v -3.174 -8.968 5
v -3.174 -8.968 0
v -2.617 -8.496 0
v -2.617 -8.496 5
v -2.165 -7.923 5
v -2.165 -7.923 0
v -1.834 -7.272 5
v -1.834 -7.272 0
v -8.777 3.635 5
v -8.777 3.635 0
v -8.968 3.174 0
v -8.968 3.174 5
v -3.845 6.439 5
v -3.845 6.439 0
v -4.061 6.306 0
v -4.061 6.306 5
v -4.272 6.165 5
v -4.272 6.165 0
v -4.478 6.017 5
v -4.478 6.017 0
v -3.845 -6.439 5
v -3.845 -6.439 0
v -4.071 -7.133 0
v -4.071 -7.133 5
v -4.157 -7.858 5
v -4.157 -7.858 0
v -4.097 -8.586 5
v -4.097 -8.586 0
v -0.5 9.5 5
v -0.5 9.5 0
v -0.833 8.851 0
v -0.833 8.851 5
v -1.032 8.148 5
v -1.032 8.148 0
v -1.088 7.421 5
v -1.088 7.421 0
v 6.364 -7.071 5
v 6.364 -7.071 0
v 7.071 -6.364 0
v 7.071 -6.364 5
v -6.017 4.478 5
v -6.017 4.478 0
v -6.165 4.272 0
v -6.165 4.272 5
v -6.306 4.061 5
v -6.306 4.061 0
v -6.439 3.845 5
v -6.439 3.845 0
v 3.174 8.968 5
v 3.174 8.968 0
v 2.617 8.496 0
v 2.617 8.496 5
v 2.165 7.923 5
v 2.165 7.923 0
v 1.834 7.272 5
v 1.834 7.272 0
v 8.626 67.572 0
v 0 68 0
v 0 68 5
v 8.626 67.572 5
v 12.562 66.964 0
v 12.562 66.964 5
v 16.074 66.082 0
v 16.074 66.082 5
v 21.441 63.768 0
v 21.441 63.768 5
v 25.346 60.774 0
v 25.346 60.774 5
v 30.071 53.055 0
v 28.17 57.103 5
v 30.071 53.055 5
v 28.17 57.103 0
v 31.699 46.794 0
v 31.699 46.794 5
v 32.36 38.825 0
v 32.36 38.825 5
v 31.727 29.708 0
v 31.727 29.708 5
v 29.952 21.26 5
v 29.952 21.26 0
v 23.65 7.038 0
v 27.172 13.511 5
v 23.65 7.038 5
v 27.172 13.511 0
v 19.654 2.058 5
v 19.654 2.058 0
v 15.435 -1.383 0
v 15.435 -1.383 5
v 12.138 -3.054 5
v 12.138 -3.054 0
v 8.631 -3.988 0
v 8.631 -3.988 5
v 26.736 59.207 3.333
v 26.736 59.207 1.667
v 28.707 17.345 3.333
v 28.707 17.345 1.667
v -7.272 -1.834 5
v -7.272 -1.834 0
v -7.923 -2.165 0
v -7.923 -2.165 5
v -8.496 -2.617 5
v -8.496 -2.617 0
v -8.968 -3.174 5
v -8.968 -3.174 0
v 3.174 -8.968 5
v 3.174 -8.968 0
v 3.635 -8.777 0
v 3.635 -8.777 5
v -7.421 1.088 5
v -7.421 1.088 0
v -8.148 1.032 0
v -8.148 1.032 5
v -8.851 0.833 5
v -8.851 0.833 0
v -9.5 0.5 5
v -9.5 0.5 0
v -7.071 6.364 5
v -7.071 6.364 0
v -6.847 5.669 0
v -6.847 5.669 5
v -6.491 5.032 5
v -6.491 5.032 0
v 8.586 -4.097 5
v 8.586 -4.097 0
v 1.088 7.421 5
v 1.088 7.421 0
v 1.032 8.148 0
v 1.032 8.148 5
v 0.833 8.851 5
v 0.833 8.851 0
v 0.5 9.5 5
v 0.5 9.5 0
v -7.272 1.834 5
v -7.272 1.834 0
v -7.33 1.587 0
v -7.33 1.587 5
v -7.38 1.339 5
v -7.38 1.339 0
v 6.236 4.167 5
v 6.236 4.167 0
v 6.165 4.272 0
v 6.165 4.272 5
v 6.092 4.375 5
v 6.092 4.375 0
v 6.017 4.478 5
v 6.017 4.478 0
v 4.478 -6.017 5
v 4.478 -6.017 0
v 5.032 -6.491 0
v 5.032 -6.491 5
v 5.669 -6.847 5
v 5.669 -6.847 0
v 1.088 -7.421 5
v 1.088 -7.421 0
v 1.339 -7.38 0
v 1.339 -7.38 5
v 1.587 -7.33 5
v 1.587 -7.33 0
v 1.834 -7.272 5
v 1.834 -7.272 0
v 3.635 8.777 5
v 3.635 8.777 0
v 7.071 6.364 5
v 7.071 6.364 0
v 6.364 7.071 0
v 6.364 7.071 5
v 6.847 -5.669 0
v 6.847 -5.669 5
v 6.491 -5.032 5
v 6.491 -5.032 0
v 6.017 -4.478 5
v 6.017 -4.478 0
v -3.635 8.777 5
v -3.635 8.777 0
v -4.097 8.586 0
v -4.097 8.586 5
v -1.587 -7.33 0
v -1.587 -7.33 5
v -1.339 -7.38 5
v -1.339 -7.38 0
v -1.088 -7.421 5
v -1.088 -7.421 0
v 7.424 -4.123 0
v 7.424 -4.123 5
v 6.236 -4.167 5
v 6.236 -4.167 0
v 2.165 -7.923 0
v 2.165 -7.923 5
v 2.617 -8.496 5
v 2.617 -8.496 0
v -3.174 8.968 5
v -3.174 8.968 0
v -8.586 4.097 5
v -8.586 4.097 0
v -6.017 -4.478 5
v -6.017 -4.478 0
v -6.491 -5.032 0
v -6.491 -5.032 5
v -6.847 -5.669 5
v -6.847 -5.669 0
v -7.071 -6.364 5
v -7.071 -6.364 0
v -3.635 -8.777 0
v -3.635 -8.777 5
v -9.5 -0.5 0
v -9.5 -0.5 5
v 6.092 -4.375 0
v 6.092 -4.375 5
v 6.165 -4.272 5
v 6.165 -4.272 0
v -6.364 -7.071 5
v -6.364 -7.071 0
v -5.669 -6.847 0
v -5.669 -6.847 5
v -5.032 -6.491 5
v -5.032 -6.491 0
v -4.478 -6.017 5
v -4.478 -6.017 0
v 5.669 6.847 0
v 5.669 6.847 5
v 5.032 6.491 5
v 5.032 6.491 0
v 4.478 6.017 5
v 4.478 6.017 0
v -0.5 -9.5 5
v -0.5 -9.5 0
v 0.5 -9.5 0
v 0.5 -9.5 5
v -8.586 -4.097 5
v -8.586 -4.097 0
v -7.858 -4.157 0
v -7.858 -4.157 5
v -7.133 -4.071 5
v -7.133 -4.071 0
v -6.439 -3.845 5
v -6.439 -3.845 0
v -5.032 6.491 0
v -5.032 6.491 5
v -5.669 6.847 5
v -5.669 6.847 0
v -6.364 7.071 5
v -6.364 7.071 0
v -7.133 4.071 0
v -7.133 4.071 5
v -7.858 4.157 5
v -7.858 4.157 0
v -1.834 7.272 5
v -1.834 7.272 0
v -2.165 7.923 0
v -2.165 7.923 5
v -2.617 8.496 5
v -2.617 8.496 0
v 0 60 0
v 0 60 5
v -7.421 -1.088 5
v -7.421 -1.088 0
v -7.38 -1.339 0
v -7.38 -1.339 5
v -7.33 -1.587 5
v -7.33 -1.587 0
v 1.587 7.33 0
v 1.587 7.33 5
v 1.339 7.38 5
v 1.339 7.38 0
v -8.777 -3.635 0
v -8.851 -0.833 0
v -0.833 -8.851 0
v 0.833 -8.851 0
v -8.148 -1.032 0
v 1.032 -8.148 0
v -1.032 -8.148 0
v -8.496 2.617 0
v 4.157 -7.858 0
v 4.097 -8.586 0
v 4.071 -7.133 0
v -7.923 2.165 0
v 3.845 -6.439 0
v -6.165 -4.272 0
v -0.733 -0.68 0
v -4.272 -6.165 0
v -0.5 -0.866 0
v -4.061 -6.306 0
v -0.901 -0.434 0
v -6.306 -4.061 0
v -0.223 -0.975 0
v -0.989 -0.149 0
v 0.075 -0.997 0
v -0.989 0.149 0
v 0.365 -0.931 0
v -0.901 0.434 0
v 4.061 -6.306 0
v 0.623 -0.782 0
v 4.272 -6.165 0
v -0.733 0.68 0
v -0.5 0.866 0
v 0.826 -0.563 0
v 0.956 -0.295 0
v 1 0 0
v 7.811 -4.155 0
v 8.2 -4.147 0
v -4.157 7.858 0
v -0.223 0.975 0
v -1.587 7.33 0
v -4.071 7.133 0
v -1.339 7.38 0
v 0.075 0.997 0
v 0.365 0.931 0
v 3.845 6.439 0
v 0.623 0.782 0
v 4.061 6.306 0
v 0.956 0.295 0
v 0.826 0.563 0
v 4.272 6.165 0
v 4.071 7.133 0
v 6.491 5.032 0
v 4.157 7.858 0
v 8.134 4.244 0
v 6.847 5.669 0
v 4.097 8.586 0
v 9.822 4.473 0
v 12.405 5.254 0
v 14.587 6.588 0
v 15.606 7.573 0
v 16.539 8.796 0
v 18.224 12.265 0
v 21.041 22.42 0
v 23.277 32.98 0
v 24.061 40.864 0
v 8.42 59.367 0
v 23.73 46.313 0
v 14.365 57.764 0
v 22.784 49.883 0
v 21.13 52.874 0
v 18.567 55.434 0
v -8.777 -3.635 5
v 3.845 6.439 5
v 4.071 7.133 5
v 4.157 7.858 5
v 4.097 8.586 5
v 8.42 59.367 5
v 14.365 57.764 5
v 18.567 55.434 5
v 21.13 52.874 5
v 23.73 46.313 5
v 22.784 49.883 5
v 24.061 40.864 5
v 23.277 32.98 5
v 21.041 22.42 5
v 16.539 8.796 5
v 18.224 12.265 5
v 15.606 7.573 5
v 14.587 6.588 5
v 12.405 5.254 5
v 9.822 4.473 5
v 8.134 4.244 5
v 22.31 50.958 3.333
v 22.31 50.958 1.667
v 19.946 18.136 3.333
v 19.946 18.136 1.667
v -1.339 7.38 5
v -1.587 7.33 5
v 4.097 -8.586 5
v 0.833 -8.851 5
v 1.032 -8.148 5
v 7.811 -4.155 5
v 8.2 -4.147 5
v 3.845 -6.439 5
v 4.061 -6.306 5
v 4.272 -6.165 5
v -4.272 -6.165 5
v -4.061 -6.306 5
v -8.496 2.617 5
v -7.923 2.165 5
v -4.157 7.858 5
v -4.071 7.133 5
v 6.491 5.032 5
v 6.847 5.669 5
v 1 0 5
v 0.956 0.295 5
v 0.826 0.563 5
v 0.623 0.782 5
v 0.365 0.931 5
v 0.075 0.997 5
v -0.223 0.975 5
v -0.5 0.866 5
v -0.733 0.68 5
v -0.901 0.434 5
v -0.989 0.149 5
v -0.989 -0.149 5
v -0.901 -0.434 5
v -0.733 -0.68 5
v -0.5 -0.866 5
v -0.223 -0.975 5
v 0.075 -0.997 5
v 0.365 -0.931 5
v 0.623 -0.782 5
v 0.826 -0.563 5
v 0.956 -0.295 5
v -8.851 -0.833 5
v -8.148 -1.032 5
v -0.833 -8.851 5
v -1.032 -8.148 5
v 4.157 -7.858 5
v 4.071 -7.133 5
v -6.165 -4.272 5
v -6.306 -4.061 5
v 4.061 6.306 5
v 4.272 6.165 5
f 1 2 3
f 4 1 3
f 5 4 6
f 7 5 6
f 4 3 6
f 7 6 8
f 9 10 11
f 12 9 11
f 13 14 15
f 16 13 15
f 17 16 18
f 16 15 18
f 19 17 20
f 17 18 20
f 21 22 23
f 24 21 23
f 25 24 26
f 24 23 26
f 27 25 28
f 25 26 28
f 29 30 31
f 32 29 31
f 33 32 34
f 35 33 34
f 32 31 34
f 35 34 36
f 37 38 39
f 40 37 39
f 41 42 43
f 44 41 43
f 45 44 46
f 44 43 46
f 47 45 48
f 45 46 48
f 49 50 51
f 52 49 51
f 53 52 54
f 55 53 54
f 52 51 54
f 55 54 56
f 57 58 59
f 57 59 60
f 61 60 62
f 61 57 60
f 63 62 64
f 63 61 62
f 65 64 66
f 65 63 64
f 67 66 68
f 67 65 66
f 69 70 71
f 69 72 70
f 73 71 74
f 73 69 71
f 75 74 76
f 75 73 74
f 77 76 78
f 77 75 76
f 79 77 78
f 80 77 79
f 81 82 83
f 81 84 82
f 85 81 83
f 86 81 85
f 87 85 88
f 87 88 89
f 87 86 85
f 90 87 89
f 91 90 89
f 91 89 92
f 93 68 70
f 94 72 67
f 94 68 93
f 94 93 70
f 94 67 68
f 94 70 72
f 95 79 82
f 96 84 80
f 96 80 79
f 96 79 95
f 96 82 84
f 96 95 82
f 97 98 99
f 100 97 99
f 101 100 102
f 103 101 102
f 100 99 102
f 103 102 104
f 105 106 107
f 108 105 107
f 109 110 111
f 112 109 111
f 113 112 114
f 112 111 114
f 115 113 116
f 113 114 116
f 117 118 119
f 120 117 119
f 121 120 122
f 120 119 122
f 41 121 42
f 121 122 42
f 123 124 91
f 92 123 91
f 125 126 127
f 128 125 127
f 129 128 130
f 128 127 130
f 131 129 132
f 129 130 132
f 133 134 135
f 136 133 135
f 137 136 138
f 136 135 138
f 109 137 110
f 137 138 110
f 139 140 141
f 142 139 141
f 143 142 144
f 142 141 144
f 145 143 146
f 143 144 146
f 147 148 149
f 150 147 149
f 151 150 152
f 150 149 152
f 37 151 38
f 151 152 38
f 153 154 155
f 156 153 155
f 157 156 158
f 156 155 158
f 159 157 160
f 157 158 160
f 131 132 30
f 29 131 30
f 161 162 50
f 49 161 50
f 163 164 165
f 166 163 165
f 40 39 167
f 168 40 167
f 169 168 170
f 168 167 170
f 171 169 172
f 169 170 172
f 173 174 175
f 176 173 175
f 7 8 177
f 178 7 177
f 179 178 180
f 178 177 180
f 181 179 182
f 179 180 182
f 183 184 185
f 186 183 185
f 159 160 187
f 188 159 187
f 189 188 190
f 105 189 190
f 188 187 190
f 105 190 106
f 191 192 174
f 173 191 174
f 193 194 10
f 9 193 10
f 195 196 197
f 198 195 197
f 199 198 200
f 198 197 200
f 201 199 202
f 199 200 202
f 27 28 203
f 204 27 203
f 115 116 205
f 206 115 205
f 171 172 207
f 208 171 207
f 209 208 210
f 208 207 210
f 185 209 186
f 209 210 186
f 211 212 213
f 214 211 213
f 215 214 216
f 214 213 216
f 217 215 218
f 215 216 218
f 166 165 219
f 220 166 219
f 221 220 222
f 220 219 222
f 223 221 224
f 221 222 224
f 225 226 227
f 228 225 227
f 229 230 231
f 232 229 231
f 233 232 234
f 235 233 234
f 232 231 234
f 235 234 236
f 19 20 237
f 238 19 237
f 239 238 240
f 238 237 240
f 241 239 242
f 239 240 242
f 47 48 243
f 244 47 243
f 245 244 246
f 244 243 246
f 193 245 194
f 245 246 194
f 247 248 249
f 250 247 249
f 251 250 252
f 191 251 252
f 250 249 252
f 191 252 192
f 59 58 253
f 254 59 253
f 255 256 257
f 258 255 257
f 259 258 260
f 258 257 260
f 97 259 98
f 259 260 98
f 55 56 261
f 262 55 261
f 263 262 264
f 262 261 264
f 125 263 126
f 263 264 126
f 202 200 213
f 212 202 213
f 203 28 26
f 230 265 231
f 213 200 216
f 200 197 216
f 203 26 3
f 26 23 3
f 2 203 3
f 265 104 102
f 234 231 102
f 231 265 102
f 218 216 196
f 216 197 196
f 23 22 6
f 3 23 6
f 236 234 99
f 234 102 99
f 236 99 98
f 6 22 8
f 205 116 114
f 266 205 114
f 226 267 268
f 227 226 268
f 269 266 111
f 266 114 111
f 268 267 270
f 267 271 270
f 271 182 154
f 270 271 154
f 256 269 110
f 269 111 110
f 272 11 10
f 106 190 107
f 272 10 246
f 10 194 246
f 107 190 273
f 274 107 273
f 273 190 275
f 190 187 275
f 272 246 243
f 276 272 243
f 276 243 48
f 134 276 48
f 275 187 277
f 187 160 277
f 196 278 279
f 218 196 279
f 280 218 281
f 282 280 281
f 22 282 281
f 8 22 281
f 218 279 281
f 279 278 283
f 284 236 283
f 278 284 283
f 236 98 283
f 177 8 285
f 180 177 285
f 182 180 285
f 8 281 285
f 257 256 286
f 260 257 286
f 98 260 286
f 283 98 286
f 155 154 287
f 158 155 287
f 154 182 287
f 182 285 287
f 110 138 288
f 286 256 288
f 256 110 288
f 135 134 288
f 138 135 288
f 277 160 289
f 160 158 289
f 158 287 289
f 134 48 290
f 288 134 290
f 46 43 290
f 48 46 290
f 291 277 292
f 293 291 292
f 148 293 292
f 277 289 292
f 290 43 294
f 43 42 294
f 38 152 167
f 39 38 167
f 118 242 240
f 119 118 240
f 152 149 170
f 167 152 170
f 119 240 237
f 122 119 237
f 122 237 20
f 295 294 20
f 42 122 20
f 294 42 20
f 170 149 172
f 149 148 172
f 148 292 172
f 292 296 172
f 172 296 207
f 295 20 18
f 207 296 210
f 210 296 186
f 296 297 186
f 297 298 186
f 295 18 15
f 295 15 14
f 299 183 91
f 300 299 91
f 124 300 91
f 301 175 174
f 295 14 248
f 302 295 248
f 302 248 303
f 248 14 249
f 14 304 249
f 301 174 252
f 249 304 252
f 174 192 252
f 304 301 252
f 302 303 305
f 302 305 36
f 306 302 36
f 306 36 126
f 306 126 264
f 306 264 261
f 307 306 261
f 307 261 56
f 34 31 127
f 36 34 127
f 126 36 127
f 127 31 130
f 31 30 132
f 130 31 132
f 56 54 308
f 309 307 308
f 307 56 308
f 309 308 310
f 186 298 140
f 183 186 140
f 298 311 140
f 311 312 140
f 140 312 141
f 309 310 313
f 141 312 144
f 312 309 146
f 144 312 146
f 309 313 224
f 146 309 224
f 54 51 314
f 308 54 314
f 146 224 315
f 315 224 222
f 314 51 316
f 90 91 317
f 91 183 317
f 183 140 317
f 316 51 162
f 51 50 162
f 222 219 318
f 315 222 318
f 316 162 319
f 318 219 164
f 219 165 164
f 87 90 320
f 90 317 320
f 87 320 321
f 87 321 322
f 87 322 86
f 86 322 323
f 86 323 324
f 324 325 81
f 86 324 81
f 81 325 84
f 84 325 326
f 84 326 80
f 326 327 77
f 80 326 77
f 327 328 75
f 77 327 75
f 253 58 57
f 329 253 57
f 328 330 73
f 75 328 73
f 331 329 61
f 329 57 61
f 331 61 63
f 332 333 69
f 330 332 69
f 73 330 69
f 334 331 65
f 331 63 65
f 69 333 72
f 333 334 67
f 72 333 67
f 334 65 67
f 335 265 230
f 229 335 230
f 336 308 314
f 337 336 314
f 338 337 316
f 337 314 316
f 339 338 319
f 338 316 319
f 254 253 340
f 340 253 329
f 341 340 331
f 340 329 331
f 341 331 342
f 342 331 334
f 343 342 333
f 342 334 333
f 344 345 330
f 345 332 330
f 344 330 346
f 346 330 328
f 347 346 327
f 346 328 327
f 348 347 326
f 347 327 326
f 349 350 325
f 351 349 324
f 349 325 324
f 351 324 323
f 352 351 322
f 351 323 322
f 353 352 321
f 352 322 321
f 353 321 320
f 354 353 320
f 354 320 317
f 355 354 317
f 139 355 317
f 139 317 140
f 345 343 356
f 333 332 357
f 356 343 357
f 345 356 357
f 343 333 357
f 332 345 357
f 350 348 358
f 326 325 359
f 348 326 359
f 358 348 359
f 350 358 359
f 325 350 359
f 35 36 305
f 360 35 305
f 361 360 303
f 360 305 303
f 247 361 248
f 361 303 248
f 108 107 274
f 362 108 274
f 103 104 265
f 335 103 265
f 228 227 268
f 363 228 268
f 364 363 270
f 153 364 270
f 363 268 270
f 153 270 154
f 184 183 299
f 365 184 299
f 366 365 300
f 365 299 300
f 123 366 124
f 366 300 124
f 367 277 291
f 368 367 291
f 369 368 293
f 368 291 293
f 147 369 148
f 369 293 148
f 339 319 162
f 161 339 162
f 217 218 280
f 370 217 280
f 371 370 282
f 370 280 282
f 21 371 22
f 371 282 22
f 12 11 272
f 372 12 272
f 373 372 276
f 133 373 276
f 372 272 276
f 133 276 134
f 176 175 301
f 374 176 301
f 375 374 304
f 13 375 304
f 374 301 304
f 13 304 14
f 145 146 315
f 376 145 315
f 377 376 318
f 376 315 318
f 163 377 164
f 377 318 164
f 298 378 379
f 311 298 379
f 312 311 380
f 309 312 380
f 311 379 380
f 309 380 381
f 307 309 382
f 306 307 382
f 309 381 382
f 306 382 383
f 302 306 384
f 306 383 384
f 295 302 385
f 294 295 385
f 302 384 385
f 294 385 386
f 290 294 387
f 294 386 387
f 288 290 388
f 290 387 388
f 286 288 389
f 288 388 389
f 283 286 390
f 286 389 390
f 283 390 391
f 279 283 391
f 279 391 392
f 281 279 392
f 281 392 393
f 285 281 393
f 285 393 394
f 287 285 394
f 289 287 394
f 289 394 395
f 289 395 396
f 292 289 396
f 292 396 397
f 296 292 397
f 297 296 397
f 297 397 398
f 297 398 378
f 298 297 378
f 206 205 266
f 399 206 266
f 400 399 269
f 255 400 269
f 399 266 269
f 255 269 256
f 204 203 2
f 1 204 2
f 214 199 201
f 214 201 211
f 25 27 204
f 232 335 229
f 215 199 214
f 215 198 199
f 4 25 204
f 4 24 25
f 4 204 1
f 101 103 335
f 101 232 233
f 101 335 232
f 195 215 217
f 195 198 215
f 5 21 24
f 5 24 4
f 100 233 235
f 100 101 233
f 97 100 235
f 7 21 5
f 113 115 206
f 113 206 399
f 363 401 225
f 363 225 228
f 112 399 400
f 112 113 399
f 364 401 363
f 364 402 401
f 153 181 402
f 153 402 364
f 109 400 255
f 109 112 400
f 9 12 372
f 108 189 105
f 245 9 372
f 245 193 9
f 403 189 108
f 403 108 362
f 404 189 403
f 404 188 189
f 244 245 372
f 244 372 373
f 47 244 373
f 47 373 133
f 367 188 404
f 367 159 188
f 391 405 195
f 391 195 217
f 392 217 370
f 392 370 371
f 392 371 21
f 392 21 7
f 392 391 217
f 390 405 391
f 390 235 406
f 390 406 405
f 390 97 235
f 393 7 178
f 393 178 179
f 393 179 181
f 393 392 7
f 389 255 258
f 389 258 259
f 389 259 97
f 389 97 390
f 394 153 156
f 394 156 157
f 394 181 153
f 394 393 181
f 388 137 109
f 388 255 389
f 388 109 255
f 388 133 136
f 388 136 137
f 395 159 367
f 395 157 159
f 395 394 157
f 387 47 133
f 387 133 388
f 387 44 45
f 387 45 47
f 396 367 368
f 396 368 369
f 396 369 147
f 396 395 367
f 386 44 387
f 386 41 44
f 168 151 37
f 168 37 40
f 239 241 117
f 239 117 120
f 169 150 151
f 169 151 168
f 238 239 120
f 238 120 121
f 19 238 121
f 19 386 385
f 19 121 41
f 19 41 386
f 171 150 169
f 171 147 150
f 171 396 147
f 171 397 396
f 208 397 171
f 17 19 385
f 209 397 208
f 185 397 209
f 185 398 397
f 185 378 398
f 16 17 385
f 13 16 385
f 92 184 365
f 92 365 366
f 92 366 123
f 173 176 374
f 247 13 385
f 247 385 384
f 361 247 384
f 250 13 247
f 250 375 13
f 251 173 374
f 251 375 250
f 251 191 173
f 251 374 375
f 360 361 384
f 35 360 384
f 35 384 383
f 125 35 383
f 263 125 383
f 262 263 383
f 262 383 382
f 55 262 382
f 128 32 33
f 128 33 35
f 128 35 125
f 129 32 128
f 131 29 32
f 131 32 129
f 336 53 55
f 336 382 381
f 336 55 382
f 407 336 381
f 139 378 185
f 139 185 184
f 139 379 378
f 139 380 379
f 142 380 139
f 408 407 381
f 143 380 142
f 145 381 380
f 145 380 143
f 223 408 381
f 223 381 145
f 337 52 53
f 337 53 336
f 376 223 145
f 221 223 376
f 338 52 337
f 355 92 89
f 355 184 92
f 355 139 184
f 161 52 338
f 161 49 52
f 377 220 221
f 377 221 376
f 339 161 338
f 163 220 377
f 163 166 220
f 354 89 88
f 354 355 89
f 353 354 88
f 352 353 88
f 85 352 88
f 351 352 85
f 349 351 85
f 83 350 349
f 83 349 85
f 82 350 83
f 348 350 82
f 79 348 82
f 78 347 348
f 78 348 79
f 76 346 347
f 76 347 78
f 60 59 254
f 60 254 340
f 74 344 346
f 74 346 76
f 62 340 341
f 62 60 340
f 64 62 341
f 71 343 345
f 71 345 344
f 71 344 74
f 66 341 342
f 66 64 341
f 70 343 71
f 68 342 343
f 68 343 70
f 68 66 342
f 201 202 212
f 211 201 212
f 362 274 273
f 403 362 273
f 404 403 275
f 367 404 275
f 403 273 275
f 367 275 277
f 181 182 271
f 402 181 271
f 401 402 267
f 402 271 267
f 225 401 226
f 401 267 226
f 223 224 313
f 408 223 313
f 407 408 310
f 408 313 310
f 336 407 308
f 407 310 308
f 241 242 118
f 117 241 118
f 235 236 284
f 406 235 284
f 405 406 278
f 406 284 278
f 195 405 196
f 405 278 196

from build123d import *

# Parameters (mm, degrees)
F1_DEPTH = 5
F2_R     = 1
F3_DEPTH = 5.001
F5_DEPTH = 5


with BuildPart() as f1:
    # F0 (on Top) → F1 (new body)
    with BuildSketch(Plane.XY):
        with BuildLine():
            ThreePointArc((7.4206173165, -1.0883191822), (7.4801280027, -0.5456052265), (7.5, 0))
            ThreePointArc((7.5, 0), (7.4801280027, 0.5456052265), (7.4206173165, 1.0883191822))
            ThreePointArc((7.4206173165, 1.0883191822), (7.355889603, 1.4631774151), (7.2722381774, 1.8342714877))
            ThreePointArc((7.2722381774, 1.8342714877), (6.9290964938, 2.8701257427), (6.4392747372, 3.8452231222))
            ThreePointArc((6.4392747372, 3.8452231222), (6.2360220923, 4.1667767476), (6.0167266989, 4.4776109513))
            ThreePointArc((6.0167266989, 4.4776109513), (5.3033008589, 5.3033008589), (4.4776109513, 6.0167266989))
            ThreePointArc((4.4776109513, 6.0167266989), (4.1667767476, 6.2360220923), (3.8452231222, 6.4392747372))
            ThreePointArc((3.8452231222, 6.4392747372), (2.8701257427, 6.9290964938), (1.8342714877, 7.2722381774))
            ThreePointArc((1.8342714877, 7.2722381774), (1.4631774151, 7.355889603), (1.0883191822, 7.4206173165))
            ThreePointArc((1.0883191822, 7.4206173165), (0, 7.5), (-1.0883191822, 7.4206173165))
            ThreePointArc((-1.0883191822, 7.4206173165), (-1.4631774151, 7.355889603), (-1.8342714877, 7.2722381774))
            ThreePointArc((-1.8342714877, 7.2722381774), (-2.8701257427, 6.9290964938), (-3.8452231222, 6.4392747372))
            ThreePointArc((-3.8452231222, 6.4392747372), (-4.1667767476, 6.2360220923), (-4.4776109513, 6.0167266989))
            ThreePointArc((-4.4776109513, 6.0167266989), (-5.3033008589, 5.3033008589), (-6.0167266989, 4.4776109513))
            ThreePointArc((-6.0167266989, 4.4776109513), (-6.2360220923, 4.1667767476), (-6.4392747372, 3.8452231222))
            ThreePointArc((-6.4392747372, 3.8452231222), (-6.9290964938, 2.8701257427), (-7.2722381774, 1.8342714877))
            ThreePointArc((-7.2722381774, 1.8342714877), (-7.355889603, 1.4631774151), (-7.4206173165, 1.0883191822))
            ThreePointArc((-7.4206173165, 1.0883191822), (-7.5, 0), (-7.4206173165, -1.0883191822))
            ThreePointArc((-7.4206173165, -1.0883191822), (-7.355889603, -1.4631774151), (-7.2722381774, -1.8342714877))
            ThreePointArc((-7.2722381774, -1.8342714877), (-6.9290964938, -2.8701257427), (-6.4392747372, -3.8452231222))
            ThreePointArc((-6.4392747372, -3.8452231222), (-6.2360220923, -4.1667767476), (-6.0167266989, -4.4776109513))
            ThreePointArc((-6.0167266989, -4.4776109513), (-5.3033008589, -5.3033008589), (-4.4776109513, -6.0167266989))
            ThreePointArc((-4.4776109513, -6.0167266989), (-4.1667767476, -6.2360220923), (-3.8452231222, -6.4392747372))
            ThreePointArc((-3.8452231222, -6.4392747372), (-2.8701257427, -6.9290964938), (-1.8342714877, -7.2722381774))
            ThreePointArc((-1.8342714877, -7.2722381774), (-1.4631774151, -7.355889603), (-1.0883191822, -7.4206173165))
            ThreePointArc((-1.0883191822, -7.4206173165), (0, -7.5), (1.0883191822, -7.4206173165))
            ThreePointArc((1.0883191822, -7.4206173165), (1.4631774151, -7.355889603), (1.8342714877, -7.2722381774))
            ThreePointArc((1.8342714877, -7.2722381774), (2.8701257427, -6.9290964938), (3.8452231222, -6.4392747372))
            ThreePointArc((3.8452231222, -6.4392747372), (4.1667767476, -6.2360220923), (4.4776109513, -6.0167266989))
            ThreePointArc((4.4776109513, -6.0167266989), (5.3033008589, -5.3033008589), (6.0167266989, -4.4776109513))
            ThreePointArc((6.0167266989, -4.4776109513), (6.2360220923, -4.1667767476), (6.4392747372, -3.8452231222))
            ThreePointArc((6.4392747372, -3.8452231222), (6.9290964938, -2.8701257427), (7.2722381774, -1.8342714877))
            ThreePointArc((7.2722381774, -1.8342714877), (7.355889603, -1.4631774151), (7.4206173165, -1.0883191822))
        make_face()
        with BuildLine():
            ThreePointArc((7.4206173165, 1.0883191822), (7.4801280027, 0.5456052265), (7.5, 0))
            ThreePointArc((7.5, 0), (7.4801280027, -0.5456052265), (7.4206173165, -1.0883191822))
            ThreePointArc((7.4206173165, -1.0883191822), (8.5043518229, -0.9498278009), (9.5, -0.5))
            Line((9.5, -0.5), (9.5, 0))
            Line((9.5, 0), (9.5, 0.5))
            ThreePointArc((9.5, 0.5), (8.5043518229, 0.9498278009), (7.4206173165, 1.0883191822))
        make_face()
        with BuildLine():
            ThreePointArc((6.4392747372, 3.8452231222), (6.9290964938, 2.8701257427), (7.2722381774, 1.8342714877))
            ThreePointArc((7.2722381774, 1.8342714877), (8.2204799494, 2.376948081), (8.968197275, 3.1735528412))
            Line((8.968197275, 3.1735528412), (8.7768555589, 3.6354926075))
            Line((8.7768555589, 3.6354926075), (8.5855138427, 4.0974323737))
            ThreePointArc((8.5855138427, 4.0974323737), (7.4935132234, 4.1320010103), (6.4392747372, 3.8452231222))
        make_face()
        with BuildLine():
            ThreePointArc((8.968197275, -3.1735528412), (8.2204799494, -2.376948081), (7.2722381774, -1.8342714877))
            ThreePointArc((7.2722381774, -1.8342714877), (6.9290964938, -2.8701257427), (6.4392747372, -3.8452231222))
            ThreePointArc((6.4392747372, -3.8452231222), (7.4935132234, -4.1320010103), (8.5855138427, -4.0974323737))
            Line((8.5855138427, -4.0974323737), (8.7768555589, -3.6354926075))
            Line((8.7768555589, -3.6354926075), (8.968197275, -3.1735528412))
        make_face()
        with BuildLine():
            ThreePointArc((4.4776109513, 6.0167266989), (5.3033008589, 5.3033008589), (6.0167266989, 4.4776109513))
            ThreePointArc((6.0167266989, 4.4776109513), (6.6851145225, 5.3418551646), (7.0710678119, 6.3639610307))
            Line((7.0710678119, 6.3639610307), (6.7175144213, 6.7175144213))
            Line((6.7175144213, 6.7175144213), (6.3639610307, 7.0710678119))
            ThreePointArc((6.3639610307, 7.0710678119), (5.3418551646, 6.6851145225), (4.4776109513, 6.0167266989))
        make_face()
        with BuildLine():
            ThreePointArc((7.0710678119, -6.3639610307), (6.6851145225, -5.3418551646), (6.0167266989, -4.4776109513))
            ThreePointArc((6.0167266989, -4.4776109513), (5.3033008589, -5.3033008589), (4.4776109513, -6.0167266989))
            ThreePointArc((4.4776109513, -6.0167266989), (5.3418551646, -6.6851145225), (6.3639610307, -7.0710678119))
            Line((6.3639610307, -7.0710678119), (6.7175144213, -6.7175144213))
            Line((6.7175144213, -6.7175144213), (7.0710678119, -6.3639610307))
        make_face()
        with BuildLine():
            ThreePointArc((1.8342714877, 7.2722381774), (2.8701257427, 6.9290964938), (3.8452231222, 6.4392747372))
            ThreePointArc((3.8452231222, 6.4392747372), (4.1320010103, 7.4935132234), (4.0974323737, 8.5855138427))
            Line((4.0974323737, 8.5855138427), (3.6354926075, 8.7768555589))
            Line((3.6354926075, 8.7768555589), (3.1735528412, 8.968197275))
            ThreePointArc((3.1735528412, 8.968197275), (2.376948081, 8.2204799494), (1.8342714877, 7.2722381774))
        make_face()
        with BuildLine():
            ThreePointArc((4.0974323737, -8.5855138427), (4.1320010103, -7.4935132234), (3.8452231222, -6.4392747372))
            ThreePointArc((3.8452231222, -6.4392747372), (2.8701257427, -6.9290964938), (1.8342714877, -7.2722381774))
            ThreePointArc((1.8342714877, -7.2722381774), (2.376948081, -8.2204799494), (3.1735528412, -8.968197275))
            Line((3.1735528412, -8.968197275), (3.6354926075, -8.7768555589))
            Line((3.6354926075, -8.7768555589), (4.0974323737, -8.5855138427))
        make_face()
        with BuildLine():
            ThreePointArc((-1.0883191822, 7.4206173165), (0, 7.5), (1.0883191822, 7.4206173165))
            ThreePointArc((1.0883191822, 7.4206173165), (0.9498278009, 8.5043518229), (0.5, 9.5))
            Line((0.5, 9.5), (0, 9.5))
            Line((0, 9.5), (-0.5, 9.5))
            ThreePointArc((-0.5, 9.5), (-0.9498278009, 8.5043518229), (-1.0883191822, 7.4206173165))
        make_face()
        with BuildLine():
            ThreePointArc((0.5, -9.5), (0.9498278009, -8.5043518229), (1.0883191822, -7.4206173165))
            ThreePointArc((1.0883191822, -7.4206173165), (0, -7.5), (-1.0883191822, -7.4206173165))
            ThreePointArc((-1.0883191822, -7.4206173165), (-0.9498278009, -8.5043518229), (-0.5, -9.5))
            Line((-0.5, -9.5), (0, -9.5))
            Line((0, -9.5), (0.5, -9.5))
        make_face()
        with BuildLine():
            ThreePointArc((-3.8452231222, 6.4392747372), (-2.8701257427, 6.9290964938), (-1.8342714877, 7.2722381774))
            ThreePointArc((-1.8342714877, 7.2722381774), (-2.376948081, 8.2204799494), (-3.1735528412, 8.968197275))
            Line((-3.1735528412, 8.968197275), (-3.6354926075, 8.7768555589))
            Line((-3.6354926075, 8.7768555589), (-4.0974323737, 8.5855138427))
            ThreePointArc((-4.0974323737, 8.5855138427), (-4.1320010103, 7.4935132234), (-3.8452231222, 6.4392747372))
        make_face()
        with BuildLine():
            ThreePointArc((-3.1735528412, -8.968197275), (-2.376948081, -8.2204799494), (-1.8342714877, -7.2722381774))
            ThreePointArc((-1.8342714877, -7.2722381774), (-2.8701257427, -6.9290964938), (-3.8452231222, -6.4392747372))
            ThreePointArc((-3.8452231222, -6.4392747372), (-4.1320010103, -7.4935132234), (-4.0974323737, -8.5855138427))
            Line((-4.0974323737, -8.5855138427), (-3.6354926075, -8.7768555589))
            Line((-3.6354926075, -8.7768555589), (-3.1735528412, -8.968197275))
        make_face()
        with BuildLine():
            ThreePointArc((-6.0167266989, 4.4776109513), (-5.3033008589, 5.3033008589), (-4.4776109513, 6.0167266989))
            ThreePointArc((-4.4776109513, 6.0167266989), (-5.3418551646, 6.6851145225), (-6.3639610307, 7.0710678119))
            Line((-6.3639610307, 7.0710678119), (-6.7175144213, 6.7175144213))
            Line((-6.7175144213, 6.7175144213), (-7.0710678119, 6.3639610307))
            ThreePointArc((-7.0710678119, 6.3639610307), (-6.6851145225, 5.3418551646), (-6.0167266989, 4.4776109513))
        make_face()
        with BuildLine():
            ThreePointArc((-6.3639610307, -7.0710678119), (-5.3418551646, -6.6851145225), (-4.4776109513, -6.0167266989))
            ThreePointArc((-4.4776109513, -6.0167266989), (-5.3033008589, -5.3033008589), (-6.0167266989, -4.4776109513))
            ThreePointArc((-6.0167266989, -4.4776109513), (-6.6851145225, -5.3418551646), (-7.0710678119, -6.3639610307))
            Line((-7.0710678119, -6.3639610307), (-6.7175144213, -6.7175144213))
            Line((-6.7175144213, -6.7175144213), (-6.3639610307, -7.0710678119))
        make_face()
        with BuildLine():
            ThreePointArc((-7.2722381774, 1.8342714877), (-6.9290964938, 2.8701257427), (-6.4392747372, 3.8452231222))
            ThreePointArc((-6.4392747372, 3.8452231222), (-7.4935132234, 4.1320010103), (-8.5855138427, 4.0974323737))
            Line((-8.5855138427, 4.0974323737), (-8.7768555589, 3.6354926075))
            Line((-8.7768555589, 3.6354926075), (-8.968197275, 3.1735528412))
            ThreePointArc((-8.968197275, 3.1735528412), (-8.2204799494, 2.376948081), (-7.2722381774, 1.8342714877))
        make_face()
        with BuildLine():
            ThreePointArc((-8.5855138427, -4.0974323737), (-7.4935132234, -4.1320010103), (-6.4392747372, -3.8452231222))
            ThreePointArc((-6.4392747372, -3.8452231222), (-6.9290964938, -2.8701257427), (-7.2722381774, -1.8342714877))
            ThreePointArc((-7.2722381774, -1.8342714877), (-8.2204799494, -2.376948081), (-8.968197275, -3.1735528412))
            Line((-8.968197275, -3.1735528412), (-8.7768555589, -3.6354926075))
            Line((-8.7768555589, -3.6354926075), (-8.5855138427, -4.0974323737))
        make_face()
        with BuildLine():
            ThreePointArc((-7.4206173165, -1.0883191822), (-7.5, 0), (-7.4206173165, 1.0883191822))
            ThreePointArc((-7.4206173165, 1.0883191822), (-8.5043518229, 0.9498278009), (-9.5, 0.5))
            Line((-9.5, 0.5), (-9.5, 0))
            Line((-9.5, 0), (-9.5, -0.5))
            ThreePointArc((-9.5, -0.5), (-8.5043518229, -0.9498278009), (-7.4206173165, -1.0883191822))
        make_face()
    extrude(amount=F1_DEPTH)

    # F2 (on face) → F3 (cut, through all)
    with BuildSketch(Plane.XY.offset(5)):
        Circle(F2_R)
    extrude(amount=-F3_DEPTH, mode=Mode.SUBTRACT)

    # F4 (on Top) → F5 (join, through all)
    with BuildSketch(Plane.XY):
        with BuildLine():
            Line((0, 68), (0, 60))
            add(Edge.make_bspline(
                [(0, 60), (10, 60), (29.3466646239, 55.2092842401), (19.911473837, 17.6173132233), (16.2360220923, 4.1667767476), (6.2360220923, 4.1667767476)],
                knots=[0, 0, 0, 0, 0.3256379151, 0.7063644579, 1, 1, 1, 1], degree=3))
            Line((6.2360220923, 4.1667767476), (6.2360220923, -4.1667767476))
            add(Edge.make_bspline(
                [(0, 68), (10, 68), (34.0503046573, 65.1461115539), (33.6892675607, 15.742605531), (16.2360220923, -4.1667767476), (6.2360220923, -4.1667767476)],
                knots=[0, 0, 0, 0, 0.3056637116, 0.6786508364, 1, 1, 1, 1], degree=3))
        make_face()
    extrude(amount=F5_DEPTH)


solid = f1.part
